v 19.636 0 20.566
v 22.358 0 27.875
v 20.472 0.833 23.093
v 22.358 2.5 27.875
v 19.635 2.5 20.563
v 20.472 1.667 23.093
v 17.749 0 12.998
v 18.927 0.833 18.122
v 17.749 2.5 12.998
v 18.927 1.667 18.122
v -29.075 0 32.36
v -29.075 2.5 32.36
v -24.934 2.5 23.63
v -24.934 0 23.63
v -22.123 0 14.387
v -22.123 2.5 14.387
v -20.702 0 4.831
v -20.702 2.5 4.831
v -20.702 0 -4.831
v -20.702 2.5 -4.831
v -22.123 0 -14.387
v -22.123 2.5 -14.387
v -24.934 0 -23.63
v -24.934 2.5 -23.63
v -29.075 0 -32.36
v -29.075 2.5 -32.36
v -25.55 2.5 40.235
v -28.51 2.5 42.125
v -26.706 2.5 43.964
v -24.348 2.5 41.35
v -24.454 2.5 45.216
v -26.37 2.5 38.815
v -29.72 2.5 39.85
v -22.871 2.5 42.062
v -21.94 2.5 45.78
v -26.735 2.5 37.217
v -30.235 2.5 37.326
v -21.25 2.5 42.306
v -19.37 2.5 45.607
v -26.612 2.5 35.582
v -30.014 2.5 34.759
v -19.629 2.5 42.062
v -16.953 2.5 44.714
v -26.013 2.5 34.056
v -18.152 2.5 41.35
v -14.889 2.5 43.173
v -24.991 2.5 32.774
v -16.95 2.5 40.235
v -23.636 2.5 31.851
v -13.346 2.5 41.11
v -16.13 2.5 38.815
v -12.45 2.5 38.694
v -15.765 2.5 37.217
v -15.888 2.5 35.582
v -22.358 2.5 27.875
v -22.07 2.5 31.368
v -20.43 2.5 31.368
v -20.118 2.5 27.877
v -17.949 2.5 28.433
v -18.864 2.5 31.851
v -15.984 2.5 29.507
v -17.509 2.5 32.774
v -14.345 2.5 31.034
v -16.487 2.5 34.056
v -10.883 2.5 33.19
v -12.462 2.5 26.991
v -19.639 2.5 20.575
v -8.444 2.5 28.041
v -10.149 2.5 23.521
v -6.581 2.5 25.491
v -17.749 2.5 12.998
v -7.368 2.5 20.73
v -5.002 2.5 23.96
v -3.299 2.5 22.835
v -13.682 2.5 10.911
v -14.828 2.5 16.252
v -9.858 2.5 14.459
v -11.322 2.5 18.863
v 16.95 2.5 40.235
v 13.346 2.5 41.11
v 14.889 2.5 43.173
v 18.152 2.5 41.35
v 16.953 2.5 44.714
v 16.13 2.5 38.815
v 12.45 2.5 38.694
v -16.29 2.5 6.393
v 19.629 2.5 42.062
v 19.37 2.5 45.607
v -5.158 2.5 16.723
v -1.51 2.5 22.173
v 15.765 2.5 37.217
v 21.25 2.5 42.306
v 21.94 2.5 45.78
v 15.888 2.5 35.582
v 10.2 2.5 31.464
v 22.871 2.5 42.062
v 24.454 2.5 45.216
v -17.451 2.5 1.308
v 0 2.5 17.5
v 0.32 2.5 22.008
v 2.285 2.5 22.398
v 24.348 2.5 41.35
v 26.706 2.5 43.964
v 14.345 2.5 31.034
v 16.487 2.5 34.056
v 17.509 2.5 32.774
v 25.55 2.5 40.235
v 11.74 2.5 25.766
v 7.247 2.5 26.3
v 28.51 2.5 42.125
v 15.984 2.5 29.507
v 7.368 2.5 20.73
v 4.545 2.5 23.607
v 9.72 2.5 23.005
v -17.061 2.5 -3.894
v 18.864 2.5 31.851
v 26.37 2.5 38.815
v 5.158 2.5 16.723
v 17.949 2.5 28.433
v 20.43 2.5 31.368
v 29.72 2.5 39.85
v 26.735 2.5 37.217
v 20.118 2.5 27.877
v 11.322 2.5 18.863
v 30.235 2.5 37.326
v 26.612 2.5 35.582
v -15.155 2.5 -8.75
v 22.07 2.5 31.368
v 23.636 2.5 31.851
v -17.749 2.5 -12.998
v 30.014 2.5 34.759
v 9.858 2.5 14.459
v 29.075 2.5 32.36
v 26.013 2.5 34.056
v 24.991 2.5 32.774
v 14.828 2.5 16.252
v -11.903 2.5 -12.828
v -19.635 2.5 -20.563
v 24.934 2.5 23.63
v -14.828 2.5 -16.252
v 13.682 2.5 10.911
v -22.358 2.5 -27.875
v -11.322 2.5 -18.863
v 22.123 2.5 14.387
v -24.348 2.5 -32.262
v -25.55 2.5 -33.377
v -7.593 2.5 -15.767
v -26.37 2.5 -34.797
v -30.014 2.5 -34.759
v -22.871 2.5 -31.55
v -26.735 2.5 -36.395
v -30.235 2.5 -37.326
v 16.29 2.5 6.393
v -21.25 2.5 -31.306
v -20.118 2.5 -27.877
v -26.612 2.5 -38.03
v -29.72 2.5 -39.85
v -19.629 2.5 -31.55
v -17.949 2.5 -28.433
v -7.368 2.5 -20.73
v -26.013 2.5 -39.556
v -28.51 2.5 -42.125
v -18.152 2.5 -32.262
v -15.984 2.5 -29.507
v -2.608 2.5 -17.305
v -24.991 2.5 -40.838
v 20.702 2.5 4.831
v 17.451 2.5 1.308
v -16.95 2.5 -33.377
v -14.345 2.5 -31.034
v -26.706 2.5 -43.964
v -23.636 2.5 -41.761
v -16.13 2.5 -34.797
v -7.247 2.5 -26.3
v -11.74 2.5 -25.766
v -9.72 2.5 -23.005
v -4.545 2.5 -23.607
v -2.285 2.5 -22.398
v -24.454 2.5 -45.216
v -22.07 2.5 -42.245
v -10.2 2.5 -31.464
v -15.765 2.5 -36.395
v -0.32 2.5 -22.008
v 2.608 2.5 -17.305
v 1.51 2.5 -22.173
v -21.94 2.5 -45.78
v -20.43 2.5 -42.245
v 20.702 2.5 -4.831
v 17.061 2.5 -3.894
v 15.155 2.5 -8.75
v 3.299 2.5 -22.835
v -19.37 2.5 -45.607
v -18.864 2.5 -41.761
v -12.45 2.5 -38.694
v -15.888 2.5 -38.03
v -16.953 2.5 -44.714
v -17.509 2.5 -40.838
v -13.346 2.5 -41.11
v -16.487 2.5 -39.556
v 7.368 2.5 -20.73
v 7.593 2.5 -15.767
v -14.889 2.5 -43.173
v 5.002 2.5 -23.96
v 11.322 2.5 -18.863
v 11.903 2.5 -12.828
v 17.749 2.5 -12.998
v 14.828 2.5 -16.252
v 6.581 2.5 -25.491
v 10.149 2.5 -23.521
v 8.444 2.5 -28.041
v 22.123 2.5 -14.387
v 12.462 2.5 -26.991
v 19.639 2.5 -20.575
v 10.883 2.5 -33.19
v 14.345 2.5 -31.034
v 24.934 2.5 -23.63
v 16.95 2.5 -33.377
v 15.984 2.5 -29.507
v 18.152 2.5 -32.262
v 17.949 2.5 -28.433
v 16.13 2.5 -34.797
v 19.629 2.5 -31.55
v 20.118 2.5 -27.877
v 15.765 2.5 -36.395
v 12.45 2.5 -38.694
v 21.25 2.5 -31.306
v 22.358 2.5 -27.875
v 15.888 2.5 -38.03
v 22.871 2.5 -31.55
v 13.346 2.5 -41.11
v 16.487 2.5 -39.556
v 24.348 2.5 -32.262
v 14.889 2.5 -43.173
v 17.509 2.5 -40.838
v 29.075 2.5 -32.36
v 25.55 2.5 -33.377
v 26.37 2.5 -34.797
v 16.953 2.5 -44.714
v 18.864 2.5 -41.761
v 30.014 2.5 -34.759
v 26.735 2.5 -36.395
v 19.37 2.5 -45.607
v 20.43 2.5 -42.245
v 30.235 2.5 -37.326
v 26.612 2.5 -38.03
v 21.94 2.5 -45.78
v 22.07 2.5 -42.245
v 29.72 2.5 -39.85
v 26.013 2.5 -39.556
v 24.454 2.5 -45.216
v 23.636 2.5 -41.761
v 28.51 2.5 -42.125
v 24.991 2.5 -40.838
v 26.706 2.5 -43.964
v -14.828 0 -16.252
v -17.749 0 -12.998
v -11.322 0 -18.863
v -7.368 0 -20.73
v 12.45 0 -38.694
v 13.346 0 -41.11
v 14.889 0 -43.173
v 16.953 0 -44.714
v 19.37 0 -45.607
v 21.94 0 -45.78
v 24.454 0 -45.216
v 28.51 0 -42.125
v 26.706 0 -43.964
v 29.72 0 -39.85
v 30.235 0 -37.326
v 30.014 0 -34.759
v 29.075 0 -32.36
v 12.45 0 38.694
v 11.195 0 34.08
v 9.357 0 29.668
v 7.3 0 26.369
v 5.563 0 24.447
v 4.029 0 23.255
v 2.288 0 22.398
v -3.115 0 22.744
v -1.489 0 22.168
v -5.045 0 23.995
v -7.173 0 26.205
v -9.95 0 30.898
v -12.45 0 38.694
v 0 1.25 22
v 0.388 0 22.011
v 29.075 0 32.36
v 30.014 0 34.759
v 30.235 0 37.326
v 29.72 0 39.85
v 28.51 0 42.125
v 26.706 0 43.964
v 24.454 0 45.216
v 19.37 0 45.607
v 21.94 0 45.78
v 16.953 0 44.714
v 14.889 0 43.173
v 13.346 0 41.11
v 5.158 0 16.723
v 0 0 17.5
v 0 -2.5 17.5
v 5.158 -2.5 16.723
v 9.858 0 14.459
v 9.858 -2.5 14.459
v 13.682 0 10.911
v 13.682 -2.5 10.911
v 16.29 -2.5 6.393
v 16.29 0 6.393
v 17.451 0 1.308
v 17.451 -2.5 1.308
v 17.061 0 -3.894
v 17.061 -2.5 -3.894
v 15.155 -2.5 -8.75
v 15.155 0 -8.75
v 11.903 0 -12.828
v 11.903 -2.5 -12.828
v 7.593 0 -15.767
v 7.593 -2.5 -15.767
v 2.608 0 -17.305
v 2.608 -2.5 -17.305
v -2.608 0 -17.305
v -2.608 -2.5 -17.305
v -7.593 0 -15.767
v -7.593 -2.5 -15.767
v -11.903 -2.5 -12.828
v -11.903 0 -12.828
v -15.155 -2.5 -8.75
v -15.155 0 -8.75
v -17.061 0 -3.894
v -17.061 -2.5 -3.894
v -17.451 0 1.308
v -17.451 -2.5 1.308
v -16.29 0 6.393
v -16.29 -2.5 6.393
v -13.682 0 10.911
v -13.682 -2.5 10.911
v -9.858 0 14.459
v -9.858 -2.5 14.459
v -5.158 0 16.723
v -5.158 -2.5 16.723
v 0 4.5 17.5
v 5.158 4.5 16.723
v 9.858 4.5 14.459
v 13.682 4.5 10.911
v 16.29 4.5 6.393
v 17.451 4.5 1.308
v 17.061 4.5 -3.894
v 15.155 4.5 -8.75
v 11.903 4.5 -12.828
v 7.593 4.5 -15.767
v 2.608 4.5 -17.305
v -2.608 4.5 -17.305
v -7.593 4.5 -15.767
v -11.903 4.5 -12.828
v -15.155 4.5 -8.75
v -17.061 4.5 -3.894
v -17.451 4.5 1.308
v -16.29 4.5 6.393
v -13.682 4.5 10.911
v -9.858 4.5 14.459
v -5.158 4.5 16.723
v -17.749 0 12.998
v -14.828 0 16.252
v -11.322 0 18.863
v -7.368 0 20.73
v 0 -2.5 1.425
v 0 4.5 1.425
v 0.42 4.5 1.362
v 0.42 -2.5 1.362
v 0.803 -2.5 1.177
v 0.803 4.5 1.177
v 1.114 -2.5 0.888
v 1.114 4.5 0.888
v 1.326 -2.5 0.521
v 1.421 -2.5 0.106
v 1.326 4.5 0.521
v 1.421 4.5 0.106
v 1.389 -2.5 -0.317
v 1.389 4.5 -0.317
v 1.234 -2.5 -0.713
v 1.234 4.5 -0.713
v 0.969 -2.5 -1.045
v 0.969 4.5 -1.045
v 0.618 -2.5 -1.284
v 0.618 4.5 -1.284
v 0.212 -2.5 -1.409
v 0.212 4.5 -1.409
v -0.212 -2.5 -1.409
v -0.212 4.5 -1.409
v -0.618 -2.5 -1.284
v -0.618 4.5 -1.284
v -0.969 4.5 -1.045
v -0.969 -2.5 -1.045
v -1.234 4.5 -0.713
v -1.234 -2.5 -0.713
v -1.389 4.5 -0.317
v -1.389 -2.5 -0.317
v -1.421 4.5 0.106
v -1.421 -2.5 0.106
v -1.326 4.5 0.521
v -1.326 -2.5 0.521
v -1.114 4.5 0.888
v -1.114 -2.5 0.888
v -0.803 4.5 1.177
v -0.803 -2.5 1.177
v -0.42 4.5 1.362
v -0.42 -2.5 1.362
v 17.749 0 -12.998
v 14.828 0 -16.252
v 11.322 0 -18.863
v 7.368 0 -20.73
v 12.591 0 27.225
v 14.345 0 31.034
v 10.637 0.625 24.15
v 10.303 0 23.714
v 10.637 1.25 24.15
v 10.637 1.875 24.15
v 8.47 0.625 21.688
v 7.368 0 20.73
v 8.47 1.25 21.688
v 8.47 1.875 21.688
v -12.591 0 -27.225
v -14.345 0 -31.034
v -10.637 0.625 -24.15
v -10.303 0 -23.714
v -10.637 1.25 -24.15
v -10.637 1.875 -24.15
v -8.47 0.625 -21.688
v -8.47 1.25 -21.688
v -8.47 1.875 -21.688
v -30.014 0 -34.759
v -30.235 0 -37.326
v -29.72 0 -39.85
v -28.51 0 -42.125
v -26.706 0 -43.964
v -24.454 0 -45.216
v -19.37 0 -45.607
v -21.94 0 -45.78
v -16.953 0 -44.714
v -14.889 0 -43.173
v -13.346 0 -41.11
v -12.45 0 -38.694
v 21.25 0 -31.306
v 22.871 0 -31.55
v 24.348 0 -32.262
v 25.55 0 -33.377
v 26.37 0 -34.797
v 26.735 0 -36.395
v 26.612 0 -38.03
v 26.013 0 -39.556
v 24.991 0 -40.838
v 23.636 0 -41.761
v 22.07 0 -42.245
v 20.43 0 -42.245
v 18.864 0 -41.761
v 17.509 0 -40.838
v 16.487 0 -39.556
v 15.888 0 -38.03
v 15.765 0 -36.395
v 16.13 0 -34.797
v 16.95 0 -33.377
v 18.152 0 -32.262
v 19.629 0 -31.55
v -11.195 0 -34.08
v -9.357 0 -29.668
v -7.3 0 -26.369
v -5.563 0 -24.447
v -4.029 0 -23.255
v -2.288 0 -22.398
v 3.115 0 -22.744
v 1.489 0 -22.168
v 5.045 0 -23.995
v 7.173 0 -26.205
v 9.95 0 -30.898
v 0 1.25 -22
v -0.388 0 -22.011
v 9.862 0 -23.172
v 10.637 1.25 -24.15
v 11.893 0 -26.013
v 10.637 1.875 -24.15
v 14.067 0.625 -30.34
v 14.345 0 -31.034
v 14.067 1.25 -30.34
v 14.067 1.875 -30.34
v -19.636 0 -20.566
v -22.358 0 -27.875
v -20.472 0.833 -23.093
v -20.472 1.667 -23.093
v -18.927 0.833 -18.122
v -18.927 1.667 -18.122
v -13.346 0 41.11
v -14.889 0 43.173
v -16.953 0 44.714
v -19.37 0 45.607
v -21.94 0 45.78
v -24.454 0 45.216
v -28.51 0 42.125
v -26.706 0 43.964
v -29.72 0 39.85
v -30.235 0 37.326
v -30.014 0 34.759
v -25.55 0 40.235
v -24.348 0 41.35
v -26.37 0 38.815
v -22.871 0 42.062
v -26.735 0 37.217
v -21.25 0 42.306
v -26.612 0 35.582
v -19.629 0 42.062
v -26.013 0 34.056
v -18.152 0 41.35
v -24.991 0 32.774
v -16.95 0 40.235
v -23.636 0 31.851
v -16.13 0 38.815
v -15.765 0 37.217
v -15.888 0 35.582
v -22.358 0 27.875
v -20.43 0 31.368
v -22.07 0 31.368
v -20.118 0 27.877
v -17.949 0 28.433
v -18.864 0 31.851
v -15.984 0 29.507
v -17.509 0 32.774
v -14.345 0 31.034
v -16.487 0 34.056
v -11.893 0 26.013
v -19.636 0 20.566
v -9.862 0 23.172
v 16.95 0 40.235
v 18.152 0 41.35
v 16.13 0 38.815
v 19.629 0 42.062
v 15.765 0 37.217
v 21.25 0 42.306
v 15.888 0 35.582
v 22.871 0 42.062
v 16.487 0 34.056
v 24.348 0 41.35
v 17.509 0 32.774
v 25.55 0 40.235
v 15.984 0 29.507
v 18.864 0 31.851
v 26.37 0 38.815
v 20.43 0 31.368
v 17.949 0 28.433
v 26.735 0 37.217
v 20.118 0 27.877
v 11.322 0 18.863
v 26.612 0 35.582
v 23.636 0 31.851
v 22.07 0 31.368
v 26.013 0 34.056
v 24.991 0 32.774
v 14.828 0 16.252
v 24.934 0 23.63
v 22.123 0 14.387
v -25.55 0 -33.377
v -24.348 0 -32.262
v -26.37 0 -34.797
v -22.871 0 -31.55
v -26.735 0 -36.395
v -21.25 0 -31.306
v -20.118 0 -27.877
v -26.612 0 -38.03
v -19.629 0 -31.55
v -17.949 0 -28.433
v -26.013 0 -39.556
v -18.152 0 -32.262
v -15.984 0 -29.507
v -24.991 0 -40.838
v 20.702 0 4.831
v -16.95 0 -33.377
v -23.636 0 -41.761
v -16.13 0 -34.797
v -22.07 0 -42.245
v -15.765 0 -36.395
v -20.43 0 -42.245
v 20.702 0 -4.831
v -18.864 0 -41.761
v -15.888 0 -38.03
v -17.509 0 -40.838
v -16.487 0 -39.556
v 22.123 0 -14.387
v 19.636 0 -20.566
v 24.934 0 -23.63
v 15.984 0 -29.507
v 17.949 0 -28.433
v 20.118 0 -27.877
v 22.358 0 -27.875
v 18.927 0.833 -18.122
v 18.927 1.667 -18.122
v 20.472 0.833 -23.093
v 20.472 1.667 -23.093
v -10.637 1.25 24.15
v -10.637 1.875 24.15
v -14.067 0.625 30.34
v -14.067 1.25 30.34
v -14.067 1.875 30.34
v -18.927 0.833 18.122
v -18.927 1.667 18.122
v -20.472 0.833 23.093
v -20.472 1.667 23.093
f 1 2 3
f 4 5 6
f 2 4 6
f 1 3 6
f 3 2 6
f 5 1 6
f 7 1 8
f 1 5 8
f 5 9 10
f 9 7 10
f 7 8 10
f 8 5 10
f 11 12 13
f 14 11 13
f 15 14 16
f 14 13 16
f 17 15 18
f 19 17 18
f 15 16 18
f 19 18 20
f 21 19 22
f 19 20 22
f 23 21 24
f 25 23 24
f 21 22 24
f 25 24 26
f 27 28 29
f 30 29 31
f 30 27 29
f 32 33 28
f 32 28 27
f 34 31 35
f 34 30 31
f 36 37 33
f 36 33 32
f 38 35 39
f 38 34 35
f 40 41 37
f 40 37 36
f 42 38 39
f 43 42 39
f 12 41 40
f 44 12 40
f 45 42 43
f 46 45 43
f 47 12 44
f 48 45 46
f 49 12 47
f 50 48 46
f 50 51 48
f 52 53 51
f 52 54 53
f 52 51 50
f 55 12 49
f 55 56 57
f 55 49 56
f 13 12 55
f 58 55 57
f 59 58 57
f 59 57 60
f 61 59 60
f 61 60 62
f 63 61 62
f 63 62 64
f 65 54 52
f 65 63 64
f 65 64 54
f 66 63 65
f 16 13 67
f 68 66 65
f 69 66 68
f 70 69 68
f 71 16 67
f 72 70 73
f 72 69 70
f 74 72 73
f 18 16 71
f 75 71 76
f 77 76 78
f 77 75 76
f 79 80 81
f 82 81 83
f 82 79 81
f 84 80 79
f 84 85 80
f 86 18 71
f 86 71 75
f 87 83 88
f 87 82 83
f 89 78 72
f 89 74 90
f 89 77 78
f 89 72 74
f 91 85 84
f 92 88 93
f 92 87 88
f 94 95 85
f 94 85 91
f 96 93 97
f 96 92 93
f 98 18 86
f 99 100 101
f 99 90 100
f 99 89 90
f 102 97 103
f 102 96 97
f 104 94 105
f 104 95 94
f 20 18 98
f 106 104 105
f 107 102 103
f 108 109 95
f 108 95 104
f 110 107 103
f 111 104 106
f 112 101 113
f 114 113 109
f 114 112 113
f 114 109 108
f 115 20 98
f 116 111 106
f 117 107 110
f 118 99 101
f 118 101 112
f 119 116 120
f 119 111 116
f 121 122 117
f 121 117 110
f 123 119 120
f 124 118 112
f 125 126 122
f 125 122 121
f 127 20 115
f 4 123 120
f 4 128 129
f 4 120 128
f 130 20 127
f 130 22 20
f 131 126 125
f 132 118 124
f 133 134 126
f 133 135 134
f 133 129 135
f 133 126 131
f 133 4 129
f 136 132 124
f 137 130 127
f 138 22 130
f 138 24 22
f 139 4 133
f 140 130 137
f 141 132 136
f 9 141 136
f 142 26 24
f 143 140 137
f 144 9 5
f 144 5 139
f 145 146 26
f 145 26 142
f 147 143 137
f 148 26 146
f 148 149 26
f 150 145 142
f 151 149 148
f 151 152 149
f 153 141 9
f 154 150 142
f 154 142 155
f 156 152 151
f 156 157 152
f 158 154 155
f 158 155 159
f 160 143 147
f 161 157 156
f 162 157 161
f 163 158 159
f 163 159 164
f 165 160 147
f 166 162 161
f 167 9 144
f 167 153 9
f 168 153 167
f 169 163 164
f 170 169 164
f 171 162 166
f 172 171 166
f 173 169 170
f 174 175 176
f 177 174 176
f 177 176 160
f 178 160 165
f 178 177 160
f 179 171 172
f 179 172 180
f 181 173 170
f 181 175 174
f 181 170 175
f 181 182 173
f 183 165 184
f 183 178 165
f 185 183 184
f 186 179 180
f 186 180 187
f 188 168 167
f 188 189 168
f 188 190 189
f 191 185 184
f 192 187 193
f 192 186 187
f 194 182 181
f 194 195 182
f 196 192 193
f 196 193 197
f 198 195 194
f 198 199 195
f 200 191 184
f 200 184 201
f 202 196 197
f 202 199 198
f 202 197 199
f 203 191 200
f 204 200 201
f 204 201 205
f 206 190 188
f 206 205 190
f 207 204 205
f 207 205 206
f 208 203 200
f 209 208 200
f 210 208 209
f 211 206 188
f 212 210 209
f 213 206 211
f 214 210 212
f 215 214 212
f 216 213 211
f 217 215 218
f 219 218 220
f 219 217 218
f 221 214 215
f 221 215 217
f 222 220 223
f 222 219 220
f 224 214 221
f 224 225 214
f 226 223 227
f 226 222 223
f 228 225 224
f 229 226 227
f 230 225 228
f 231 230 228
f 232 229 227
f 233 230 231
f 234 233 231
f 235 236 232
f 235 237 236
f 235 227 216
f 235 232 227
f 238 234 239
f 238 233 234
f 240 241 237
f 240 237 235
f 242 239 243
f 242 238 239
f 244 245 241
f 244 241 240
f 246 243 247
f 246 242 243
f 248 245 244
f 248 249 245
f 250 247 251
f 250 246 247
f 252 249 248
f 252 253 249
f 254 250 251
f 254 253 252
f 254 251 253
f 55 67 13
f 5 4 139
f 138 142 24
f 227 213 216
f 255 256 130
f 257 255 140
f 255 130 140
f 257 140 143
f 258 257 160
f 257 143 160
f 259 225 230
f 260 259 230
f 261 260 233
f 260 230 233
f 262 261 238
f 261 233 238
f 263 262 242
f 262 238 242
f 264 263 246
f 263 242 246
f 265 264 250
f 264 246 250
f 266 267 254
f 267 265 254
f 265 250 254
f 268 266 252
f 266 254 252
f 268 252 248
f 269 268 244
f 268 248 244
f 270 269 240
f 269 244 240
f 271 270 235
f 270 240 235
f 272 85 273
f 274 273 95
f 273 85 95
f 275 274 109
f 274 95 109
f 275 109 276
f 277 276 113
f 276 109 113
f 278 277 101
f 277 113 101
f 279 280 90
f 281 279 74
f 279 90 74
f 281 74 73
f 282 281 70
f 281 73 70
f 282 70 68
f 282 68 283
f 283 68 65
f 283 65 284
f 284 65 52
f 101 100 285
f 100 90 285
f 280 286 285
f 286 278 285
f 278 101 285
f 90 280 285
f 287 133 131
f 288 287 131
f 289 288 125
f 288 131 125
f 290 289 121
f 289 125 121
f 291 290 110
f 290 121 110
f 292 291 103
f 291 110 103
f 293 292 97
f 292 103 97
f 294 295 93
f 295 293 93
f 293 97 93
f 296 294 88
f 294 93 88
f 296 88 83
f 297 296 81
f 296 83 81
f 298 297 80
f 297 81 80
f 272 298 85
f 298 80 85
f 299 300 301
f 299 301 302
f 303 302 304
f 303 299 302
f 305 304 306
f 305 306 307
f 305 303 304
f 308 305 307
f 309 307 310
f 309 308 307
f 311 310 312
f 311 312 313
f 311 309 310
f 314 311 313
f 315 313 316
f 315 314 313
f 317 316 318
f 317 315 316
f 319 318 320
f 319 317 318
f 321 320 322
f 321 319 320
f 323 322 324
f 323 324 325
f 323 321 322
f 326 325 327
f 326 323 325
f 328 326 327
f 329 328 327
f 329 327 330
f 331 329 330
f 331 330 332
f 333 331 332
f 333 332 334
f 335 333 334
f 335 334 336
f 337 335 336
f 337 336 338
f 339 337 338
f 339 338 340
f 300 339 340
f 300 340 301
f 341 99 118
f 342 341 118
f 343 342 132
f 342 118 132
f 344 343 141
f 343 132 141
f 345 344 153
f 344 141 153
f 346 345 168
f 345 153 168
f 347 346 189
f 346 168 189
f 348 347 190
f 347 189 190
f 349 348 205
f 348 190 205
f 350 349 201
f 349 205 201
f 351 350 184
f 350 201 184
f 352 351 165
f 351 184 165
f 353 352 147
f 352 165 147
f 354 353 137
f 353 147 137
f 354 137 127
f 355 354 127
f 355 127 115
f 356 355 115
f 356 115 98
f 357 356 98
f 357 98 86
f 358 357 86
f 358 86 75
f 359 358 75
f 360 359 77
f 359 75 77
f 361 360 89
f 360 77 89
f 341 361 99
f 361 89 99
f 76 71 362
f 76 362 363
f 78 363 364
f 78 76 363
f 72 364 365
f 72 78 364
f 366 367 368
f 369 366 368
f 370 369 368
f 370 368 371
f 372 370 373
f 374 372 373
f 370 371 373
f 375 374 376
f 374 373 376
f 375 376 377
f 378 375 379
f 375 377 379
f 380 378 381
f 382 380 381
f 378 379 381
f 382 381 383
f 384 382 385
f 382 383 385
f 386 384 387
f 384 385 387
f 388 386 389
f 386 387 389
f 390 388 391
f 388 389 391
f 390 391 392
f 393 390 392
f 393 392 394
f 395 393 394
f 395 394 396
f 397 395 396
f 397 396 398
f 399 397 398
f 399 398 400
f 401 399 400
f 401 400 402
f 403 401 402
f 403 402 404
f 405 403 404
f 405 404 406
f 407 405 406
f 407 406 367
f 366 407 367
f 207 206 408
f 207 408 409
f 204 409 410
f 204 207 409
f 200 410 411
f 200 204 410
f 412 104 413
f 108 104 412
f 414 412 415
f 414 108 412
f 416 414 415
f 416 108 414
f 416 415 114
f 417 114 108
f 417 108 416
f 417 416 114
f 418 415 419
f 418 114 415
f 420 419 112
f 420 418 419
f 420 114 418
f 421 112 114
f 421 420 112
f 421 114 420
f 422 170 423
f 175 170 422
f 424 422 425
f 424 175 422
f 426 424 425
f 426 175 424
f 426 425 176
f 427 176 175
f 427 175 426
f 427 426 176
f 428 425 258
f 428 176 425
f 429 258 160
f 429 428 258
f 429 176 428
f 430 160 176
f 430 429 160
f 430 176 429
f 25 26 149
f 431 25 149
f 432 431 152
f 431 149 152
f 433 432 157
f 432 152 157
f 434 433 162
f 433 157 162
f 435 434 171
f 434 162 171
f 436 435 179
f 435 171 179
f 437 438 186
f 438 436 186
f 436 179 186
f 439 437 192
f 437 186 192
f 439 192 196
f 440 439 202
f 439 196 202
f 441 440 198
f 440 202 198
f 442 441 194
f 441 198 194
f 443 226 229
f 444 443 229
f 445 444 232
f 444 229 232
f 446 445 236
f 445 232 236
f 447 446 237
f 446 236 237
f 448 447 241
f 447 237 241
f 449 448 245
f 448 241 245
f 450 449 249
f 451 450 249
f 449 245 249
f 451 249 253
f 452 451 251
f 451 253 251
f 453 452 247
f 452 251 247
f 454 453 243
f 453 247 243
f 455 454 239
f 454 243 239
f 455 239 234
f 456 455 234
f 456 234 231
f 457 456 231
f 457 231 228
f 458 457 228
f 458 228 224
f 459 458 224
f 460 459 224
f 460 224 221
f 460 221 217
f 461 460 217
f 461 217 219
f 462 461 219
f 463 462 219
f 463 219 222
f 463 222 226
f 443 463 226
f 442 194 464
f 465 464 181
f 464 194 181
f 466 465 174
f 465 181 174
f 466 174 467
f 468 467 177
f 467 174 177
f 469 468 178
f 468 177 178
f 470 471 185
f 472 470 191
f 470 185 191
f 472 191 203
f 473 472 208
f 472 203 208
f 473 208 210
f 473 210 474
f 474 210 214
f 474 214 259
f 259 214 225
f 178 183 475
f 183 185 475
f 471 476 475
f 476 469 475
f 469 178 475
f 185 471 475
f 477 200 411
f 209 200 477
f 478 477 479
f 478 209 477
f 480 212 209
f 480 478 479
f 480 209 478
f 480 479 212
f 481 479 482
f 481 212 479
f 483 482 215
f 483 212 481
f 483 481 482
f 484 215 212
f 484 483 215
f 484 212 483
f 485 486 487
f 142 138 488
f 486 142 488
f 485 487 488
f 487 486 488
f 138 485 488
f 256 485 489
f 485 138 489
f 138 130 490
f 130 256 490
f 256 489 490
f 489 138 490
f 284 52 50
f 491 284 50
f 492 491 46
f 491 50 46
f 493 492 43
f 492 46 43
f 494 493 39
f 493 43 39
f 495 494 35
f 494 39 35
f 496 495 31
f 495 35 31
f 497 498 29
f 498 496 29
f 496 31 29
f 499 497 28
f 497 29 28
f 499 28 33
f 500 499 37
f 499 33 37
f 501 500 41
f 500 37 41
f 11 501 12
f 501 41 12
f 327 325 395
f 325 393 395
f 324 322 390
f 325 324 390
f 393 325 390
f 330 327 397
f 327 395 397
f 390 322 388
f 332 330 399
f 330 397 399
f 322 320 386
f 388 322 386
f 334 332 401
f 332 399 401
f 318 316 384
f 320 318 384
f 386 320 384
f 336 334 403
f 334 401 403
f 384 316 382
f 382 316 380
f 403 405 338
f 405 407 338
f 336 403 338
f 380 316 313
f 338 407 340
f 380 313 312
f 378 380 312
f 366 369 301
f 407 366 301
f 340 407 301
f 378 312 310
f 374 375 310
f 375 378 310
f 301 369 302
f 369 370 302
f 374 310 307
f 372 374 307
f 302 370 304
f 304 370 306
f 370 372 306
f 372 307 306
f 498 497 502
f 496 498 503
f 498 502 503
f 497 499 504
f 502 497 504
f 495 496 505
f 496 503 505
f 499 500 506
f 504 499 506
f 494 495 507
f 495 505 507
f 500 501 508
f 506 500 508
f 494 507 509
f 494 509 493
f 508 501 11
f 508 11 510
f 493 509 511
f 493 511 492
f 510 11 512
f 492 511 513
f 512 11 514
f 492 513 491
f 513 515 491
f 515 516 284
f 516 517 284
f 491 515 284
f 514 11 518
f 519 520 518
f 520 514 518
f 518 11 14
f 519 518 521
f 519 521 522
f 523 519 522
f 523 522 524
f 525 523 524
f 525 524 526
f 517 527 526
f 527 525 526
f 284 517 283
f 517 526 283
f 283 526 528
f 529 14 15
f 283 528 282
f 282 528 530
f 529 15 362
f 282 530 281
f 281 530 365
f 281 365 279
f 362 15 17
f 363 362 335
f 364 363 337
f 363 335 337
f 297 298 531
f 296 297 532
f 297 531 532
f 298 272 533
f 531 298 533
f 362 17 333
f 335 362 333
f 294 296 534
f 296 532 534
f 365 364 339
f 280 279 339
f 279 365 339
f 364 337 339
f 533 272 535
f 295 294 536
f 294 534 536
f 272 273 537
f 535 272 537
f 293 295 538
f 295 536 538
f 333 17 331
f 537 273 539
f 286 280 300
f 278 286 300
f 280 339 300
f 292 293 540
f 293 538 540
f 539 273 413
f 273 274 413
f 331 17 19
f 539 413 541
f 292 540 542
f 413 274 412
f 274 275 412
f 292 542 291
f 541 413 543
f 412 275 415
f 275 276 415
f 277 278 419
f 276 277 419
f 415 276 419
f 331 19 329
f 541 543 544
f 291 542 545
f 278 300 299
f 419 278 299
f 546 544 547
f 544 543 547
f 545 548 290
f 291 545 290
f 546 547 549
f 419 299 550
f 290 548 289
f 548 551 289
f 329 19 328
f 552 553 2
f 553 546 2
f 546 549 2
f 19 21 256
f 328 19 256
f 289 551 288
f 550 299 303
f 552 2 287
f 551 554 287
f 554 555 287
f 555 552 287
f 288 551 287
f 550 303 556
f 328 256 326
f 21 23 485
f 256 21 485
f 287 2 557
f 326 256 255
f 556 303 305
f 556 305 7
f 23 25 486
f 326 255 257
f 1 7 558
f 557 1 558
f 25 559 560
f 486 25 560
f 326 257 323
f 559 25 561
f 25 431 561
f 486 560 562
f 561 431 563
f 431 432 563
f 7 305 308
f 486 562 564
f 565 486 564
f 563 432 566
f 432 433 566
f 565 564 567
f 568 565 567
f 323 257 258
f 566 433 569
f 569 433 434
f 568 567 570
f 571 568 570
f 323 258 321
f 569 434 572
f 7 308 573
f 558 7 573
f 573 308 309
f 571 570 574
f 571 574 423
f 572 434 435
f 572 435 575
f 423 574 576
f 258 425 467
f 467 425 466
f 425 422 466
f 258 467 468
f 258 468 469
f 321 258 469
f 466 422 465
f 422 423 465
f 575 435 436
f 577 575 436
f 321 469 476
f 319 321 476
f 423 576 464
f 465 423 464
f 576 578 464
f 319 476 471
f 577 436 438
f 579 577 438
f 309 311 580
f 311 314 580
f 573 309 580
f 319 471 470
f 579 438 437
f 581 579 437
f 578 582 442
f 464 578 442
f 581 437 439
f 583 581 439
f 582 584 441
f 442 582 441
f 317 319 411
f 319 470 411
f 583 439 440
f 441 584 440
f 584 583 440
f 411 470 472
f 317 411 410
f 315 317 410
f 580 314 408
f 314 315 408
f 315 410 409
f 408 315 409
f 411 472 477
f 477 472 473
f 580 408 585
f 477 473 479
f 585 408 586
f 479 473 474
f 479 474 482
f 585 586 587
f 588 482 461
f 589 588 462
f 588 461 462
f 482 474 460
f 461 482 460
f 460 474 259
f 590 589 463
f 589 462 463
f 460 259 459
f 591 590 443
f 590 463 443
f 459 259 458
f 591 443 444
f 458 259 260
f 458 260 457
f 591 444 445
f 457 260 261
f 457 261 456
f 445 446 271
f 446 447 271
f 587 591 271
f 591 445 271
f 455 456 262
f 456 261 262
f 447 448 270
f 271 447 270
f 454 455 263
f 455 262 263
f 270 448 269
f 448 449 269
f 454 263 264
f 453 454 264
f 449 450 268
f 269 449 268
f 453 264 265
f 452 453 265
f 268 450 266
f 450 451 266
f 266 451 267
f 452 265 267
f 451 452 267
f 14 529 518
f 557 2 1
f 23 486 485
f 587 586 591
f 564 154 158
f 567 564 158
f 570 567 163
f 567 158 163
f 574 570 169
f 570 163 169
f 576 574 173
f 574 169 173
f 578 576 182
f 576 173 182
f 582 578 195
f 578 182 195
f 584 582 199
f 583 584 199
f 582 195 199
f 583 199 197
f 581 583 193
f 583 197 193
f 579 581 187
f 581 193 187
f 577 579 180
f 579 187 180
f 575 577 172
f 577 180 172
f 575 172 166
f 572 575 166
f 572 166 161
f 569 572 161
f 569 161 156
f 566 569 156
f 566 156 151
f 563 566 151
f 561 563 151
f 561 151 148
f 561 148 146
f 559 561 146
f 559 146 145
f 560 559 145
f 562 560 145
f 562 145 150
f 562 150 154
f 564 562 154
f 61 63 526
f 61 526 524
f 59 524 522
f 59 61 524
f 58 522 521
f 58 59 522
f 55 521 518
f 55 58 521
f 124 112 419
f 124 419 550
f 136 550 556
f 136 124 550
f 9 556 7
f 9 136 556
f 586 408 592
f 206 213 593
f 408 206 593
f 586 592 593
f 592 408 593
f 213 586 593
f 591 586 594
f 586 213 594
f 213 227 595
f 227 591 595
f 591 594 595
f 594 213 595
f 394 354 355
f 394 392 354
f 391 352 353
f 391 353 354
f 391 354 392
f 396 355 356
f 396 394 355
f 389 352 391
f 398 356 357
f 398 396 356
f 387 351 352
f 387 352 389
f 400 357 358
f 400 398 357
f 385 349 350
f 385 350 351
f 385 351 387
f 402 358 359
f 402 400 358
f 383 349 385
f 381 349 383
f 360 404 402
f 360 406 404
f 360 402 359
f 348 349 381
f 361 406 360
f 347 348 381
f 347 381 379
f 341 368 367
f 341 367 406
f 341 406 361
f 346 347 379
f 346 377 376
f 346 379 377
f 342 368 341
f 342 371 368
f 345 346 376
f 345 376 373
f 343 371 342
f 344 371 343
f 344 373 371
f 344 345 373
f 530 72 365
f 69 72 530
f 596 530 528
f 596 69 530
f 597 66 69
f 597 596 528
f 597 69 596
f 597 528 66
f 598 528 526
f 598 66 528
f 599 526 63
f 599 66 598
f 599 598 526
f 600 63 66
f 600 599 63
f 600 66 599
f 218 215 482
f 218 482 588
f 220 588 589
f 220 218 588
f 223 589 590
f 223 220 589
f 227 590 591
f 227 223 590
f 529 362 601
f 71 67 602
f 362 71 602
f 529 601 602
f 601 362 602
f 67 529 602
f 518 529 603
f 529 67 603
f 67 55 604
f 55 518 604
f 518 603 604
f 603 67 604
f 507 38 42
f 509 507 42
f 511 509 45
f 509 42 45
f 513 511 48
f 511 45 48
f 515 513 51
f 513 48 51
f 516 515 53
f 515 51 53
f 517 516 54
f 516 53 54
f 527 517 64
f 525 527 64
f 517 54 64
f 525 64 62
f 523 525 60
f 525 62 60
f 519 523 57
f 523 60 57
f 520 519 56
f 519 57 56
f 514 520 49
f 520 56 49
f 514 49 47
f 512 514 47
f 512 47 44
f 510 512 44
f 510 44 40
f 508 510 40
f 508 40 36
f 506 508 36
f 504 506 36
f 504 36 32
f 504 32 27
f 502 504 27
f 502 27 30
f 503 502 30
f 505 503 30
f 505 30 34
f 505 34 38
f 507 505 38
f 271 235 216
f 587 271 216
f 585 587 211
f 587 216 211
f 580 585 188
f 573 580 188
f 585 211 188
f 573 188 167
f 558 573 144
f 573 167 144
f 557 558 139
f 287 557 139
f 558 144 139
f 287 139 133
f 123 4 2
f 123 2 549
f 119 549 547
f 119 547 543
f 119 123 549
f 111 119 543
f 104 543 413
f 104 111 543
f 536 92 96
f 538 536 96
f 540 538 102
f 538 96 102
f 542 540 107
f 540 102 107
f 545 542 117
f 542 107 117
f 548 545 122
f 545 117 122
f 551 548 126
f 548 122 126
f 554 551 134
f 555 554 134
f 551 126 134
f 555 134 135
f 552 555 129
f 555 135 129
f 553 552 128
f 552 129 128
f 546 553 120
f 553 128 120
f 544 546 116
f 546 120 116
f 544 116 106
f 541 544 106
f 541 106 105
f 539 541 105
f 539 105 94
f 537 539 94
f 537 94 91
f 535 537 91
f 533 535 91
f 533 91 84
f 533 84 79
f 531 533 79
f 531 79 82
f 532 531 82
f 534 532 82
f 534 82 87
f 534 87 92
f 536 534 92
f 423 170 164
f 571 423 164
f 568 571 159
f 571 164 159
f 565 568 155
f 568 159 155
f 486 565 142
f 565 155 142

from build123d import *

# Parameters (mm, degrees)
SKETCH1_W                 = 100
SKETCH1_H                 = 100
BOSS_EXTRUDE1_DEPTH       = 2.5
SKETCH2_W                 = 100
SKETCH2_H                 = 100
SKETCH2_R                 = 5.5
CUT_EXTRUDE1_DEPTH        = 10
CUT_EXTRUDE3_DEPTH        = 10
SKETCH6_R                 = 17.5
BOSS_EXTRUDE11_DEPTH      = 2
BOSS_EXTRUDE11_DEPTH_BACK = 5
SKETCH7_R                 = 1.425
CUT_EXTRUDE4_DEPTH        = 56.337685614


with BuildPart() as part:
    # Sketch1 → Boss-Extrude1 (new body)
    with BuildSketch(Plane(origin=(0, 0, 0), x_dir=(1, 0, 0), z_dir=(0, 1, 0))):
        Rectangle(SKETCH1_W, SKETCH1_H)
    extrude(amount=BOSS_EXTRUDE1_DEPTH)

    # Sketch2 → Cut-Extrude1 (cut)
    with BuildSketch(Plane(origin=(0, 2.5, 0), x_dir=(1, 0, 0), z_dir=(0, 1, 0))):
        Rectangle(SKETCH2_W, SKETCH2_H)
        with BuildLine():
            ThreePointArc((-29.074945731, -32.359707621), (-20.523161881, 0), (-29.074945731, 32.359707621))
            ThreePointArc((-29.074945731, 32.359707621), (-24.454355603, 45.216317777), (-12.450207096, 38.693841525))
            add(Edge.make_bspline(
                [(-12.450207096, 38.693841525), (0, -19.342739332), (12.450207096, 38.693841525)],
                knots=[5.128046308, 5.128046308, 5.128046308, 7.438324307, 7.438324307, 7.438324307], degree=2, weights=[1, 0.403791374, 1]))
            ThreePointArc((12.450207096, 38.693841525), (24.454355603, 45.216317777), (29.074945731, 32.359707621))
            ThreePointArc((29.074945731, 32.359707621), (20.523161881, 0), (29.074945731, -32.359707621))
            ThreePointArc((29.074945731, -32.359707621), (24.454355603, -45.216317777), (12.450207096, -38.693841525))
            add(Edge.make_bspline(
                [(12.450207096, -38.693841525), (0, 19.342739332), (-12.450207096, -38.693841525)],
                knots=[5.128046308, 5.128046308, 5.128046308, 7.438324307, 7.438324307, 7.438324307], degree=2, weights=[1, 0.403791374, 1]))
            ThreePointArc((-12.450207096, -38.693841525), (-24.454355603, -45.216317777), (-29.074945731, -32.359707621))
        make_face(mode=Mode.SUBTRACT)
        with Locations(Location((-21.25, 36.806079661, 0), (0, 0, 270))):
            Circle(SKETCH2_R)
        with Locations(Location((-21.25, -36.806079661, 0), (0, 0, 270))):
            Circle(SKETCH2_R)
        with Locations(Location((21.25, -36.806079661, 0), (0, 0, 270))):
            Circle(SKETCH2_R)
        with Locations(Location((21.25, 36.806079661, 0), (0, 0, 270))):
            Circle(SKETCH2_R)
    extrude(amount=-CUT_EXTRUDE1_DEPTH, mode=Mode.SUBTRACT)

    # Sketch4 → Cut-Extrude3 (cut)
    with BuildSketch(Plane(origin=(0, 2.5, 0), x_dir=(1, 0, 0), z_dir=(0, 1, 0))):
        with BuildLine():
            ThreePointArc((-17.749489284, -12.998293356), (-13.140045691, -17.64480658), (-7.367625104, -20.729643034))
            add(Edge.make_bspline(
                [(-7.367625104, -20.729643034), (-7.747241798, -21.030061446), (-8.114529726, -21.350348356), (-9.247106431, -22.428016295), (-9.96747496, -23.25295704), (-11.975526868, -25.945450431), (-13.113170007, -28.031524091), (-14.161311212, -30.568863064), (-14.254109179, -30.800153833), (-14.345065296, -31.033569225)],
                knots=[0.658936879, 0.658936879, 0.658936879, 0.658936879, 0.6875, 0.6875, 0.75, 0.75, 0.875, 0.875, 0.887405876, 0.887405876, 0.887405876, 0.887405876], degree=3))
            ThreePointArc((-14.345065296, -31.033569225), (-17.949067849, -28.433275654), (-22.357942029, -27.874536431))
            add(Edge.make_bspline(
                [(-17.749489284, -12.998293356), (-18.730013182, -18.148505445), (-20.279042278, -23.126345909), (-22.357942029, -27.874536431)],
                knots=[0.6784999, 0.6784999, 0.6784999, 0.6784999, 0.896036051, 0.896036051, 0.896036051, 0.896036051], degree=3, weights=[0.94303917, 0.94979881, 0.960677405, 0.975674954]))
        make_face()
        with BuildLine():
            ThreePointArc((7.367625104, -20.729643034), (13.140045691, -17.64480658), (17.749489284, -12.998293356))
            add(Edge.make_bspline(
                [(22.357942029, -27.874536431), (20.279042278, -23.126345909), (18.730013182, -18.148505445), (17.749489284, -12.998293356)],
                knots=[0.103963949, 0.103963949, 0.103963949, 0.103963949, 0.3215001, 0.3215001, 0.3215001, 0.3215001], degree=3, weights=[0.975674954, 0.960677405, 0.94979881, 0.94303917]))
            ThreePointArc((22.357942029, -27.874536431), (17.949067849, -28.433275654), (14.345065296, -31.033569225))
            add(Edge.make_bspline(
                [(14.345065296, -31.033569225), (14.254109179, -30.800153832), (14.161311212, -30.568863064), (13.113170007, -28.031524091), (11.975526868, -25.945450431), (9.96747496, -23.25295704), (9.247106431, -22.428016295), (8.114529726, -21.350348356), (7.747241798, -21.030061447), (7.367625104, -20.729643034)],
                knots=[0.112594124, 0.112594124, 0.112594124, 0.112594124, 0.125, 0.125, 0.25, 0.25, 0.3125, 0.3125, 0.341063121, 0.341063121, 0.341063121, 0.341063121], degree=3))
        make_face()
        with BuildLine():
            ThreePointArc((14.345065296, 31.033569225), (17.949067849, 28.433275654), (22.357942029, 27.874536431))
            add(Edge.make_bspline(
                [(17.749489284, 12.998293356), (18.730013182, 18.148505445), (20.279042278, 23.126345909), (22.357942029, 27.874536431)],
                knots=[0.6784999, 0.6784999, 0.6784999, 0.6784999, 0.896036051, 0.896036051, 0.896036051, 0.896036051], degree=3, weights=[0.94303917, 0.94979881, 0.960677405, 0.975674954]))
            ThreePointArc((17.749489284, 12.998293356), (13.140045691, 17.64480658), (7.367625104, 20.729643034))
            add(Edge.make_bspline(
                [(7.367625104, 20.729643034), (7.747241798, 21.030061446), (8.114529726, 21.350348356), (9.247106431, 22.428016295), (9.96747496, 23.25295704), (11.975526868, 25.945450431), (13.113170007, 28.031524091), (14.161311212, 30.568863064), (14.254109179, 30.800153833), (14.345065296, 31.033569225)],
                knots=[0.658936879, 0.658936879, 0.658936879, 0.658936879, 0.6875, 0.6875, 0.75, 0.75, 0.875, 0.875, 0.887405876, 0.887405876, 0.887405876, 0.887405876], degree=3))
        make_face()
        with BuildLine():
            ThreePointArc((-14.345065296, 31.033569225), (-17.949067849, 28.433275654), (-22.357942029, 27.874536431))
            add(Edge.make_bspline(
                [(-22.357942029, 27.874536431), (-20.279042278, 23.126345909), (-18.730013182, 18.148505445), (-17.749489284, 12.998293356)],
                knots=[0.103963949, 0.103963949, 0.103963949, 0.103963949, 0.3215001, 0.3215001, 0.3215001, 0.3215001], degree=3, weights=[0.975674954, 0.960677405, 0.94979881, 0.94303917]))
            ThreePointArc((-17.749489284, 12.998293356), (-13.140045691, 17.64480658), (-7.367625104, 20.729643034))
            add(Edge.make_bspline(
                [(-14.345065296, 31.033569225), (-14.254109179, 30.800153832), (-14.161311212, 30.568863064), (-13.113170007, 28.031524091), (-11.975526868, 25.945450431), (-9.96747496, 23.25295704), (-9.247106431, 22.428016295), (-8.114529726, 21.350348356), (-7.747241798, 21.030061447), (-7.367625104, 20.729643034)],
                knots=[0.112594124, 0.112594124, 0.112594124, 0.112594124, 0.125, 0.125, 0.25, 0.25, 0.3125, 0.3125, 0.341063121, 0.341063121, 0.341063121, 0.341063121], degree=3))
        make_face()
    extrude(amount=-CUT_EXTRUDE3_DEPTH, mode=Mode.SUBTRACT)

    # Sketch6 → Boss-Extrude11 (add, two sides)
    with BuildSketch(Plane(origin=(0, 2.5, 0), x_dir=(1, 0, 0), z_dir=(0, 1, 0))) as boss_extrude11_sk:
        with Locations(Location((0, 0, 0), (0, 0, 270))):
            Circle(SKETCH6_R)
    extrude(amount=BOSS_EXTRUDE11_DEPTH)
    extrude(boss_extrude11_sk.sketch, amount=-BOSS_EXTRUDE11_DEPTH_BACK)

    # Sketch7 → Cut-Extrude4 (cut, through all)
    with BuildSketch(Plane(origin=(0, 4.5, 0), x_dir=(1, 0, 0), z_dir=(0, 1, 0))):
        with Locations(Location((0, 0, 0), (0, 0, 270))):
            Circle(SKETCH7_R)
    extrude(amount=-CUT_EXTRUDE4_DEPTH, mode=Mode.SUBTRACT)


solid = part.part
